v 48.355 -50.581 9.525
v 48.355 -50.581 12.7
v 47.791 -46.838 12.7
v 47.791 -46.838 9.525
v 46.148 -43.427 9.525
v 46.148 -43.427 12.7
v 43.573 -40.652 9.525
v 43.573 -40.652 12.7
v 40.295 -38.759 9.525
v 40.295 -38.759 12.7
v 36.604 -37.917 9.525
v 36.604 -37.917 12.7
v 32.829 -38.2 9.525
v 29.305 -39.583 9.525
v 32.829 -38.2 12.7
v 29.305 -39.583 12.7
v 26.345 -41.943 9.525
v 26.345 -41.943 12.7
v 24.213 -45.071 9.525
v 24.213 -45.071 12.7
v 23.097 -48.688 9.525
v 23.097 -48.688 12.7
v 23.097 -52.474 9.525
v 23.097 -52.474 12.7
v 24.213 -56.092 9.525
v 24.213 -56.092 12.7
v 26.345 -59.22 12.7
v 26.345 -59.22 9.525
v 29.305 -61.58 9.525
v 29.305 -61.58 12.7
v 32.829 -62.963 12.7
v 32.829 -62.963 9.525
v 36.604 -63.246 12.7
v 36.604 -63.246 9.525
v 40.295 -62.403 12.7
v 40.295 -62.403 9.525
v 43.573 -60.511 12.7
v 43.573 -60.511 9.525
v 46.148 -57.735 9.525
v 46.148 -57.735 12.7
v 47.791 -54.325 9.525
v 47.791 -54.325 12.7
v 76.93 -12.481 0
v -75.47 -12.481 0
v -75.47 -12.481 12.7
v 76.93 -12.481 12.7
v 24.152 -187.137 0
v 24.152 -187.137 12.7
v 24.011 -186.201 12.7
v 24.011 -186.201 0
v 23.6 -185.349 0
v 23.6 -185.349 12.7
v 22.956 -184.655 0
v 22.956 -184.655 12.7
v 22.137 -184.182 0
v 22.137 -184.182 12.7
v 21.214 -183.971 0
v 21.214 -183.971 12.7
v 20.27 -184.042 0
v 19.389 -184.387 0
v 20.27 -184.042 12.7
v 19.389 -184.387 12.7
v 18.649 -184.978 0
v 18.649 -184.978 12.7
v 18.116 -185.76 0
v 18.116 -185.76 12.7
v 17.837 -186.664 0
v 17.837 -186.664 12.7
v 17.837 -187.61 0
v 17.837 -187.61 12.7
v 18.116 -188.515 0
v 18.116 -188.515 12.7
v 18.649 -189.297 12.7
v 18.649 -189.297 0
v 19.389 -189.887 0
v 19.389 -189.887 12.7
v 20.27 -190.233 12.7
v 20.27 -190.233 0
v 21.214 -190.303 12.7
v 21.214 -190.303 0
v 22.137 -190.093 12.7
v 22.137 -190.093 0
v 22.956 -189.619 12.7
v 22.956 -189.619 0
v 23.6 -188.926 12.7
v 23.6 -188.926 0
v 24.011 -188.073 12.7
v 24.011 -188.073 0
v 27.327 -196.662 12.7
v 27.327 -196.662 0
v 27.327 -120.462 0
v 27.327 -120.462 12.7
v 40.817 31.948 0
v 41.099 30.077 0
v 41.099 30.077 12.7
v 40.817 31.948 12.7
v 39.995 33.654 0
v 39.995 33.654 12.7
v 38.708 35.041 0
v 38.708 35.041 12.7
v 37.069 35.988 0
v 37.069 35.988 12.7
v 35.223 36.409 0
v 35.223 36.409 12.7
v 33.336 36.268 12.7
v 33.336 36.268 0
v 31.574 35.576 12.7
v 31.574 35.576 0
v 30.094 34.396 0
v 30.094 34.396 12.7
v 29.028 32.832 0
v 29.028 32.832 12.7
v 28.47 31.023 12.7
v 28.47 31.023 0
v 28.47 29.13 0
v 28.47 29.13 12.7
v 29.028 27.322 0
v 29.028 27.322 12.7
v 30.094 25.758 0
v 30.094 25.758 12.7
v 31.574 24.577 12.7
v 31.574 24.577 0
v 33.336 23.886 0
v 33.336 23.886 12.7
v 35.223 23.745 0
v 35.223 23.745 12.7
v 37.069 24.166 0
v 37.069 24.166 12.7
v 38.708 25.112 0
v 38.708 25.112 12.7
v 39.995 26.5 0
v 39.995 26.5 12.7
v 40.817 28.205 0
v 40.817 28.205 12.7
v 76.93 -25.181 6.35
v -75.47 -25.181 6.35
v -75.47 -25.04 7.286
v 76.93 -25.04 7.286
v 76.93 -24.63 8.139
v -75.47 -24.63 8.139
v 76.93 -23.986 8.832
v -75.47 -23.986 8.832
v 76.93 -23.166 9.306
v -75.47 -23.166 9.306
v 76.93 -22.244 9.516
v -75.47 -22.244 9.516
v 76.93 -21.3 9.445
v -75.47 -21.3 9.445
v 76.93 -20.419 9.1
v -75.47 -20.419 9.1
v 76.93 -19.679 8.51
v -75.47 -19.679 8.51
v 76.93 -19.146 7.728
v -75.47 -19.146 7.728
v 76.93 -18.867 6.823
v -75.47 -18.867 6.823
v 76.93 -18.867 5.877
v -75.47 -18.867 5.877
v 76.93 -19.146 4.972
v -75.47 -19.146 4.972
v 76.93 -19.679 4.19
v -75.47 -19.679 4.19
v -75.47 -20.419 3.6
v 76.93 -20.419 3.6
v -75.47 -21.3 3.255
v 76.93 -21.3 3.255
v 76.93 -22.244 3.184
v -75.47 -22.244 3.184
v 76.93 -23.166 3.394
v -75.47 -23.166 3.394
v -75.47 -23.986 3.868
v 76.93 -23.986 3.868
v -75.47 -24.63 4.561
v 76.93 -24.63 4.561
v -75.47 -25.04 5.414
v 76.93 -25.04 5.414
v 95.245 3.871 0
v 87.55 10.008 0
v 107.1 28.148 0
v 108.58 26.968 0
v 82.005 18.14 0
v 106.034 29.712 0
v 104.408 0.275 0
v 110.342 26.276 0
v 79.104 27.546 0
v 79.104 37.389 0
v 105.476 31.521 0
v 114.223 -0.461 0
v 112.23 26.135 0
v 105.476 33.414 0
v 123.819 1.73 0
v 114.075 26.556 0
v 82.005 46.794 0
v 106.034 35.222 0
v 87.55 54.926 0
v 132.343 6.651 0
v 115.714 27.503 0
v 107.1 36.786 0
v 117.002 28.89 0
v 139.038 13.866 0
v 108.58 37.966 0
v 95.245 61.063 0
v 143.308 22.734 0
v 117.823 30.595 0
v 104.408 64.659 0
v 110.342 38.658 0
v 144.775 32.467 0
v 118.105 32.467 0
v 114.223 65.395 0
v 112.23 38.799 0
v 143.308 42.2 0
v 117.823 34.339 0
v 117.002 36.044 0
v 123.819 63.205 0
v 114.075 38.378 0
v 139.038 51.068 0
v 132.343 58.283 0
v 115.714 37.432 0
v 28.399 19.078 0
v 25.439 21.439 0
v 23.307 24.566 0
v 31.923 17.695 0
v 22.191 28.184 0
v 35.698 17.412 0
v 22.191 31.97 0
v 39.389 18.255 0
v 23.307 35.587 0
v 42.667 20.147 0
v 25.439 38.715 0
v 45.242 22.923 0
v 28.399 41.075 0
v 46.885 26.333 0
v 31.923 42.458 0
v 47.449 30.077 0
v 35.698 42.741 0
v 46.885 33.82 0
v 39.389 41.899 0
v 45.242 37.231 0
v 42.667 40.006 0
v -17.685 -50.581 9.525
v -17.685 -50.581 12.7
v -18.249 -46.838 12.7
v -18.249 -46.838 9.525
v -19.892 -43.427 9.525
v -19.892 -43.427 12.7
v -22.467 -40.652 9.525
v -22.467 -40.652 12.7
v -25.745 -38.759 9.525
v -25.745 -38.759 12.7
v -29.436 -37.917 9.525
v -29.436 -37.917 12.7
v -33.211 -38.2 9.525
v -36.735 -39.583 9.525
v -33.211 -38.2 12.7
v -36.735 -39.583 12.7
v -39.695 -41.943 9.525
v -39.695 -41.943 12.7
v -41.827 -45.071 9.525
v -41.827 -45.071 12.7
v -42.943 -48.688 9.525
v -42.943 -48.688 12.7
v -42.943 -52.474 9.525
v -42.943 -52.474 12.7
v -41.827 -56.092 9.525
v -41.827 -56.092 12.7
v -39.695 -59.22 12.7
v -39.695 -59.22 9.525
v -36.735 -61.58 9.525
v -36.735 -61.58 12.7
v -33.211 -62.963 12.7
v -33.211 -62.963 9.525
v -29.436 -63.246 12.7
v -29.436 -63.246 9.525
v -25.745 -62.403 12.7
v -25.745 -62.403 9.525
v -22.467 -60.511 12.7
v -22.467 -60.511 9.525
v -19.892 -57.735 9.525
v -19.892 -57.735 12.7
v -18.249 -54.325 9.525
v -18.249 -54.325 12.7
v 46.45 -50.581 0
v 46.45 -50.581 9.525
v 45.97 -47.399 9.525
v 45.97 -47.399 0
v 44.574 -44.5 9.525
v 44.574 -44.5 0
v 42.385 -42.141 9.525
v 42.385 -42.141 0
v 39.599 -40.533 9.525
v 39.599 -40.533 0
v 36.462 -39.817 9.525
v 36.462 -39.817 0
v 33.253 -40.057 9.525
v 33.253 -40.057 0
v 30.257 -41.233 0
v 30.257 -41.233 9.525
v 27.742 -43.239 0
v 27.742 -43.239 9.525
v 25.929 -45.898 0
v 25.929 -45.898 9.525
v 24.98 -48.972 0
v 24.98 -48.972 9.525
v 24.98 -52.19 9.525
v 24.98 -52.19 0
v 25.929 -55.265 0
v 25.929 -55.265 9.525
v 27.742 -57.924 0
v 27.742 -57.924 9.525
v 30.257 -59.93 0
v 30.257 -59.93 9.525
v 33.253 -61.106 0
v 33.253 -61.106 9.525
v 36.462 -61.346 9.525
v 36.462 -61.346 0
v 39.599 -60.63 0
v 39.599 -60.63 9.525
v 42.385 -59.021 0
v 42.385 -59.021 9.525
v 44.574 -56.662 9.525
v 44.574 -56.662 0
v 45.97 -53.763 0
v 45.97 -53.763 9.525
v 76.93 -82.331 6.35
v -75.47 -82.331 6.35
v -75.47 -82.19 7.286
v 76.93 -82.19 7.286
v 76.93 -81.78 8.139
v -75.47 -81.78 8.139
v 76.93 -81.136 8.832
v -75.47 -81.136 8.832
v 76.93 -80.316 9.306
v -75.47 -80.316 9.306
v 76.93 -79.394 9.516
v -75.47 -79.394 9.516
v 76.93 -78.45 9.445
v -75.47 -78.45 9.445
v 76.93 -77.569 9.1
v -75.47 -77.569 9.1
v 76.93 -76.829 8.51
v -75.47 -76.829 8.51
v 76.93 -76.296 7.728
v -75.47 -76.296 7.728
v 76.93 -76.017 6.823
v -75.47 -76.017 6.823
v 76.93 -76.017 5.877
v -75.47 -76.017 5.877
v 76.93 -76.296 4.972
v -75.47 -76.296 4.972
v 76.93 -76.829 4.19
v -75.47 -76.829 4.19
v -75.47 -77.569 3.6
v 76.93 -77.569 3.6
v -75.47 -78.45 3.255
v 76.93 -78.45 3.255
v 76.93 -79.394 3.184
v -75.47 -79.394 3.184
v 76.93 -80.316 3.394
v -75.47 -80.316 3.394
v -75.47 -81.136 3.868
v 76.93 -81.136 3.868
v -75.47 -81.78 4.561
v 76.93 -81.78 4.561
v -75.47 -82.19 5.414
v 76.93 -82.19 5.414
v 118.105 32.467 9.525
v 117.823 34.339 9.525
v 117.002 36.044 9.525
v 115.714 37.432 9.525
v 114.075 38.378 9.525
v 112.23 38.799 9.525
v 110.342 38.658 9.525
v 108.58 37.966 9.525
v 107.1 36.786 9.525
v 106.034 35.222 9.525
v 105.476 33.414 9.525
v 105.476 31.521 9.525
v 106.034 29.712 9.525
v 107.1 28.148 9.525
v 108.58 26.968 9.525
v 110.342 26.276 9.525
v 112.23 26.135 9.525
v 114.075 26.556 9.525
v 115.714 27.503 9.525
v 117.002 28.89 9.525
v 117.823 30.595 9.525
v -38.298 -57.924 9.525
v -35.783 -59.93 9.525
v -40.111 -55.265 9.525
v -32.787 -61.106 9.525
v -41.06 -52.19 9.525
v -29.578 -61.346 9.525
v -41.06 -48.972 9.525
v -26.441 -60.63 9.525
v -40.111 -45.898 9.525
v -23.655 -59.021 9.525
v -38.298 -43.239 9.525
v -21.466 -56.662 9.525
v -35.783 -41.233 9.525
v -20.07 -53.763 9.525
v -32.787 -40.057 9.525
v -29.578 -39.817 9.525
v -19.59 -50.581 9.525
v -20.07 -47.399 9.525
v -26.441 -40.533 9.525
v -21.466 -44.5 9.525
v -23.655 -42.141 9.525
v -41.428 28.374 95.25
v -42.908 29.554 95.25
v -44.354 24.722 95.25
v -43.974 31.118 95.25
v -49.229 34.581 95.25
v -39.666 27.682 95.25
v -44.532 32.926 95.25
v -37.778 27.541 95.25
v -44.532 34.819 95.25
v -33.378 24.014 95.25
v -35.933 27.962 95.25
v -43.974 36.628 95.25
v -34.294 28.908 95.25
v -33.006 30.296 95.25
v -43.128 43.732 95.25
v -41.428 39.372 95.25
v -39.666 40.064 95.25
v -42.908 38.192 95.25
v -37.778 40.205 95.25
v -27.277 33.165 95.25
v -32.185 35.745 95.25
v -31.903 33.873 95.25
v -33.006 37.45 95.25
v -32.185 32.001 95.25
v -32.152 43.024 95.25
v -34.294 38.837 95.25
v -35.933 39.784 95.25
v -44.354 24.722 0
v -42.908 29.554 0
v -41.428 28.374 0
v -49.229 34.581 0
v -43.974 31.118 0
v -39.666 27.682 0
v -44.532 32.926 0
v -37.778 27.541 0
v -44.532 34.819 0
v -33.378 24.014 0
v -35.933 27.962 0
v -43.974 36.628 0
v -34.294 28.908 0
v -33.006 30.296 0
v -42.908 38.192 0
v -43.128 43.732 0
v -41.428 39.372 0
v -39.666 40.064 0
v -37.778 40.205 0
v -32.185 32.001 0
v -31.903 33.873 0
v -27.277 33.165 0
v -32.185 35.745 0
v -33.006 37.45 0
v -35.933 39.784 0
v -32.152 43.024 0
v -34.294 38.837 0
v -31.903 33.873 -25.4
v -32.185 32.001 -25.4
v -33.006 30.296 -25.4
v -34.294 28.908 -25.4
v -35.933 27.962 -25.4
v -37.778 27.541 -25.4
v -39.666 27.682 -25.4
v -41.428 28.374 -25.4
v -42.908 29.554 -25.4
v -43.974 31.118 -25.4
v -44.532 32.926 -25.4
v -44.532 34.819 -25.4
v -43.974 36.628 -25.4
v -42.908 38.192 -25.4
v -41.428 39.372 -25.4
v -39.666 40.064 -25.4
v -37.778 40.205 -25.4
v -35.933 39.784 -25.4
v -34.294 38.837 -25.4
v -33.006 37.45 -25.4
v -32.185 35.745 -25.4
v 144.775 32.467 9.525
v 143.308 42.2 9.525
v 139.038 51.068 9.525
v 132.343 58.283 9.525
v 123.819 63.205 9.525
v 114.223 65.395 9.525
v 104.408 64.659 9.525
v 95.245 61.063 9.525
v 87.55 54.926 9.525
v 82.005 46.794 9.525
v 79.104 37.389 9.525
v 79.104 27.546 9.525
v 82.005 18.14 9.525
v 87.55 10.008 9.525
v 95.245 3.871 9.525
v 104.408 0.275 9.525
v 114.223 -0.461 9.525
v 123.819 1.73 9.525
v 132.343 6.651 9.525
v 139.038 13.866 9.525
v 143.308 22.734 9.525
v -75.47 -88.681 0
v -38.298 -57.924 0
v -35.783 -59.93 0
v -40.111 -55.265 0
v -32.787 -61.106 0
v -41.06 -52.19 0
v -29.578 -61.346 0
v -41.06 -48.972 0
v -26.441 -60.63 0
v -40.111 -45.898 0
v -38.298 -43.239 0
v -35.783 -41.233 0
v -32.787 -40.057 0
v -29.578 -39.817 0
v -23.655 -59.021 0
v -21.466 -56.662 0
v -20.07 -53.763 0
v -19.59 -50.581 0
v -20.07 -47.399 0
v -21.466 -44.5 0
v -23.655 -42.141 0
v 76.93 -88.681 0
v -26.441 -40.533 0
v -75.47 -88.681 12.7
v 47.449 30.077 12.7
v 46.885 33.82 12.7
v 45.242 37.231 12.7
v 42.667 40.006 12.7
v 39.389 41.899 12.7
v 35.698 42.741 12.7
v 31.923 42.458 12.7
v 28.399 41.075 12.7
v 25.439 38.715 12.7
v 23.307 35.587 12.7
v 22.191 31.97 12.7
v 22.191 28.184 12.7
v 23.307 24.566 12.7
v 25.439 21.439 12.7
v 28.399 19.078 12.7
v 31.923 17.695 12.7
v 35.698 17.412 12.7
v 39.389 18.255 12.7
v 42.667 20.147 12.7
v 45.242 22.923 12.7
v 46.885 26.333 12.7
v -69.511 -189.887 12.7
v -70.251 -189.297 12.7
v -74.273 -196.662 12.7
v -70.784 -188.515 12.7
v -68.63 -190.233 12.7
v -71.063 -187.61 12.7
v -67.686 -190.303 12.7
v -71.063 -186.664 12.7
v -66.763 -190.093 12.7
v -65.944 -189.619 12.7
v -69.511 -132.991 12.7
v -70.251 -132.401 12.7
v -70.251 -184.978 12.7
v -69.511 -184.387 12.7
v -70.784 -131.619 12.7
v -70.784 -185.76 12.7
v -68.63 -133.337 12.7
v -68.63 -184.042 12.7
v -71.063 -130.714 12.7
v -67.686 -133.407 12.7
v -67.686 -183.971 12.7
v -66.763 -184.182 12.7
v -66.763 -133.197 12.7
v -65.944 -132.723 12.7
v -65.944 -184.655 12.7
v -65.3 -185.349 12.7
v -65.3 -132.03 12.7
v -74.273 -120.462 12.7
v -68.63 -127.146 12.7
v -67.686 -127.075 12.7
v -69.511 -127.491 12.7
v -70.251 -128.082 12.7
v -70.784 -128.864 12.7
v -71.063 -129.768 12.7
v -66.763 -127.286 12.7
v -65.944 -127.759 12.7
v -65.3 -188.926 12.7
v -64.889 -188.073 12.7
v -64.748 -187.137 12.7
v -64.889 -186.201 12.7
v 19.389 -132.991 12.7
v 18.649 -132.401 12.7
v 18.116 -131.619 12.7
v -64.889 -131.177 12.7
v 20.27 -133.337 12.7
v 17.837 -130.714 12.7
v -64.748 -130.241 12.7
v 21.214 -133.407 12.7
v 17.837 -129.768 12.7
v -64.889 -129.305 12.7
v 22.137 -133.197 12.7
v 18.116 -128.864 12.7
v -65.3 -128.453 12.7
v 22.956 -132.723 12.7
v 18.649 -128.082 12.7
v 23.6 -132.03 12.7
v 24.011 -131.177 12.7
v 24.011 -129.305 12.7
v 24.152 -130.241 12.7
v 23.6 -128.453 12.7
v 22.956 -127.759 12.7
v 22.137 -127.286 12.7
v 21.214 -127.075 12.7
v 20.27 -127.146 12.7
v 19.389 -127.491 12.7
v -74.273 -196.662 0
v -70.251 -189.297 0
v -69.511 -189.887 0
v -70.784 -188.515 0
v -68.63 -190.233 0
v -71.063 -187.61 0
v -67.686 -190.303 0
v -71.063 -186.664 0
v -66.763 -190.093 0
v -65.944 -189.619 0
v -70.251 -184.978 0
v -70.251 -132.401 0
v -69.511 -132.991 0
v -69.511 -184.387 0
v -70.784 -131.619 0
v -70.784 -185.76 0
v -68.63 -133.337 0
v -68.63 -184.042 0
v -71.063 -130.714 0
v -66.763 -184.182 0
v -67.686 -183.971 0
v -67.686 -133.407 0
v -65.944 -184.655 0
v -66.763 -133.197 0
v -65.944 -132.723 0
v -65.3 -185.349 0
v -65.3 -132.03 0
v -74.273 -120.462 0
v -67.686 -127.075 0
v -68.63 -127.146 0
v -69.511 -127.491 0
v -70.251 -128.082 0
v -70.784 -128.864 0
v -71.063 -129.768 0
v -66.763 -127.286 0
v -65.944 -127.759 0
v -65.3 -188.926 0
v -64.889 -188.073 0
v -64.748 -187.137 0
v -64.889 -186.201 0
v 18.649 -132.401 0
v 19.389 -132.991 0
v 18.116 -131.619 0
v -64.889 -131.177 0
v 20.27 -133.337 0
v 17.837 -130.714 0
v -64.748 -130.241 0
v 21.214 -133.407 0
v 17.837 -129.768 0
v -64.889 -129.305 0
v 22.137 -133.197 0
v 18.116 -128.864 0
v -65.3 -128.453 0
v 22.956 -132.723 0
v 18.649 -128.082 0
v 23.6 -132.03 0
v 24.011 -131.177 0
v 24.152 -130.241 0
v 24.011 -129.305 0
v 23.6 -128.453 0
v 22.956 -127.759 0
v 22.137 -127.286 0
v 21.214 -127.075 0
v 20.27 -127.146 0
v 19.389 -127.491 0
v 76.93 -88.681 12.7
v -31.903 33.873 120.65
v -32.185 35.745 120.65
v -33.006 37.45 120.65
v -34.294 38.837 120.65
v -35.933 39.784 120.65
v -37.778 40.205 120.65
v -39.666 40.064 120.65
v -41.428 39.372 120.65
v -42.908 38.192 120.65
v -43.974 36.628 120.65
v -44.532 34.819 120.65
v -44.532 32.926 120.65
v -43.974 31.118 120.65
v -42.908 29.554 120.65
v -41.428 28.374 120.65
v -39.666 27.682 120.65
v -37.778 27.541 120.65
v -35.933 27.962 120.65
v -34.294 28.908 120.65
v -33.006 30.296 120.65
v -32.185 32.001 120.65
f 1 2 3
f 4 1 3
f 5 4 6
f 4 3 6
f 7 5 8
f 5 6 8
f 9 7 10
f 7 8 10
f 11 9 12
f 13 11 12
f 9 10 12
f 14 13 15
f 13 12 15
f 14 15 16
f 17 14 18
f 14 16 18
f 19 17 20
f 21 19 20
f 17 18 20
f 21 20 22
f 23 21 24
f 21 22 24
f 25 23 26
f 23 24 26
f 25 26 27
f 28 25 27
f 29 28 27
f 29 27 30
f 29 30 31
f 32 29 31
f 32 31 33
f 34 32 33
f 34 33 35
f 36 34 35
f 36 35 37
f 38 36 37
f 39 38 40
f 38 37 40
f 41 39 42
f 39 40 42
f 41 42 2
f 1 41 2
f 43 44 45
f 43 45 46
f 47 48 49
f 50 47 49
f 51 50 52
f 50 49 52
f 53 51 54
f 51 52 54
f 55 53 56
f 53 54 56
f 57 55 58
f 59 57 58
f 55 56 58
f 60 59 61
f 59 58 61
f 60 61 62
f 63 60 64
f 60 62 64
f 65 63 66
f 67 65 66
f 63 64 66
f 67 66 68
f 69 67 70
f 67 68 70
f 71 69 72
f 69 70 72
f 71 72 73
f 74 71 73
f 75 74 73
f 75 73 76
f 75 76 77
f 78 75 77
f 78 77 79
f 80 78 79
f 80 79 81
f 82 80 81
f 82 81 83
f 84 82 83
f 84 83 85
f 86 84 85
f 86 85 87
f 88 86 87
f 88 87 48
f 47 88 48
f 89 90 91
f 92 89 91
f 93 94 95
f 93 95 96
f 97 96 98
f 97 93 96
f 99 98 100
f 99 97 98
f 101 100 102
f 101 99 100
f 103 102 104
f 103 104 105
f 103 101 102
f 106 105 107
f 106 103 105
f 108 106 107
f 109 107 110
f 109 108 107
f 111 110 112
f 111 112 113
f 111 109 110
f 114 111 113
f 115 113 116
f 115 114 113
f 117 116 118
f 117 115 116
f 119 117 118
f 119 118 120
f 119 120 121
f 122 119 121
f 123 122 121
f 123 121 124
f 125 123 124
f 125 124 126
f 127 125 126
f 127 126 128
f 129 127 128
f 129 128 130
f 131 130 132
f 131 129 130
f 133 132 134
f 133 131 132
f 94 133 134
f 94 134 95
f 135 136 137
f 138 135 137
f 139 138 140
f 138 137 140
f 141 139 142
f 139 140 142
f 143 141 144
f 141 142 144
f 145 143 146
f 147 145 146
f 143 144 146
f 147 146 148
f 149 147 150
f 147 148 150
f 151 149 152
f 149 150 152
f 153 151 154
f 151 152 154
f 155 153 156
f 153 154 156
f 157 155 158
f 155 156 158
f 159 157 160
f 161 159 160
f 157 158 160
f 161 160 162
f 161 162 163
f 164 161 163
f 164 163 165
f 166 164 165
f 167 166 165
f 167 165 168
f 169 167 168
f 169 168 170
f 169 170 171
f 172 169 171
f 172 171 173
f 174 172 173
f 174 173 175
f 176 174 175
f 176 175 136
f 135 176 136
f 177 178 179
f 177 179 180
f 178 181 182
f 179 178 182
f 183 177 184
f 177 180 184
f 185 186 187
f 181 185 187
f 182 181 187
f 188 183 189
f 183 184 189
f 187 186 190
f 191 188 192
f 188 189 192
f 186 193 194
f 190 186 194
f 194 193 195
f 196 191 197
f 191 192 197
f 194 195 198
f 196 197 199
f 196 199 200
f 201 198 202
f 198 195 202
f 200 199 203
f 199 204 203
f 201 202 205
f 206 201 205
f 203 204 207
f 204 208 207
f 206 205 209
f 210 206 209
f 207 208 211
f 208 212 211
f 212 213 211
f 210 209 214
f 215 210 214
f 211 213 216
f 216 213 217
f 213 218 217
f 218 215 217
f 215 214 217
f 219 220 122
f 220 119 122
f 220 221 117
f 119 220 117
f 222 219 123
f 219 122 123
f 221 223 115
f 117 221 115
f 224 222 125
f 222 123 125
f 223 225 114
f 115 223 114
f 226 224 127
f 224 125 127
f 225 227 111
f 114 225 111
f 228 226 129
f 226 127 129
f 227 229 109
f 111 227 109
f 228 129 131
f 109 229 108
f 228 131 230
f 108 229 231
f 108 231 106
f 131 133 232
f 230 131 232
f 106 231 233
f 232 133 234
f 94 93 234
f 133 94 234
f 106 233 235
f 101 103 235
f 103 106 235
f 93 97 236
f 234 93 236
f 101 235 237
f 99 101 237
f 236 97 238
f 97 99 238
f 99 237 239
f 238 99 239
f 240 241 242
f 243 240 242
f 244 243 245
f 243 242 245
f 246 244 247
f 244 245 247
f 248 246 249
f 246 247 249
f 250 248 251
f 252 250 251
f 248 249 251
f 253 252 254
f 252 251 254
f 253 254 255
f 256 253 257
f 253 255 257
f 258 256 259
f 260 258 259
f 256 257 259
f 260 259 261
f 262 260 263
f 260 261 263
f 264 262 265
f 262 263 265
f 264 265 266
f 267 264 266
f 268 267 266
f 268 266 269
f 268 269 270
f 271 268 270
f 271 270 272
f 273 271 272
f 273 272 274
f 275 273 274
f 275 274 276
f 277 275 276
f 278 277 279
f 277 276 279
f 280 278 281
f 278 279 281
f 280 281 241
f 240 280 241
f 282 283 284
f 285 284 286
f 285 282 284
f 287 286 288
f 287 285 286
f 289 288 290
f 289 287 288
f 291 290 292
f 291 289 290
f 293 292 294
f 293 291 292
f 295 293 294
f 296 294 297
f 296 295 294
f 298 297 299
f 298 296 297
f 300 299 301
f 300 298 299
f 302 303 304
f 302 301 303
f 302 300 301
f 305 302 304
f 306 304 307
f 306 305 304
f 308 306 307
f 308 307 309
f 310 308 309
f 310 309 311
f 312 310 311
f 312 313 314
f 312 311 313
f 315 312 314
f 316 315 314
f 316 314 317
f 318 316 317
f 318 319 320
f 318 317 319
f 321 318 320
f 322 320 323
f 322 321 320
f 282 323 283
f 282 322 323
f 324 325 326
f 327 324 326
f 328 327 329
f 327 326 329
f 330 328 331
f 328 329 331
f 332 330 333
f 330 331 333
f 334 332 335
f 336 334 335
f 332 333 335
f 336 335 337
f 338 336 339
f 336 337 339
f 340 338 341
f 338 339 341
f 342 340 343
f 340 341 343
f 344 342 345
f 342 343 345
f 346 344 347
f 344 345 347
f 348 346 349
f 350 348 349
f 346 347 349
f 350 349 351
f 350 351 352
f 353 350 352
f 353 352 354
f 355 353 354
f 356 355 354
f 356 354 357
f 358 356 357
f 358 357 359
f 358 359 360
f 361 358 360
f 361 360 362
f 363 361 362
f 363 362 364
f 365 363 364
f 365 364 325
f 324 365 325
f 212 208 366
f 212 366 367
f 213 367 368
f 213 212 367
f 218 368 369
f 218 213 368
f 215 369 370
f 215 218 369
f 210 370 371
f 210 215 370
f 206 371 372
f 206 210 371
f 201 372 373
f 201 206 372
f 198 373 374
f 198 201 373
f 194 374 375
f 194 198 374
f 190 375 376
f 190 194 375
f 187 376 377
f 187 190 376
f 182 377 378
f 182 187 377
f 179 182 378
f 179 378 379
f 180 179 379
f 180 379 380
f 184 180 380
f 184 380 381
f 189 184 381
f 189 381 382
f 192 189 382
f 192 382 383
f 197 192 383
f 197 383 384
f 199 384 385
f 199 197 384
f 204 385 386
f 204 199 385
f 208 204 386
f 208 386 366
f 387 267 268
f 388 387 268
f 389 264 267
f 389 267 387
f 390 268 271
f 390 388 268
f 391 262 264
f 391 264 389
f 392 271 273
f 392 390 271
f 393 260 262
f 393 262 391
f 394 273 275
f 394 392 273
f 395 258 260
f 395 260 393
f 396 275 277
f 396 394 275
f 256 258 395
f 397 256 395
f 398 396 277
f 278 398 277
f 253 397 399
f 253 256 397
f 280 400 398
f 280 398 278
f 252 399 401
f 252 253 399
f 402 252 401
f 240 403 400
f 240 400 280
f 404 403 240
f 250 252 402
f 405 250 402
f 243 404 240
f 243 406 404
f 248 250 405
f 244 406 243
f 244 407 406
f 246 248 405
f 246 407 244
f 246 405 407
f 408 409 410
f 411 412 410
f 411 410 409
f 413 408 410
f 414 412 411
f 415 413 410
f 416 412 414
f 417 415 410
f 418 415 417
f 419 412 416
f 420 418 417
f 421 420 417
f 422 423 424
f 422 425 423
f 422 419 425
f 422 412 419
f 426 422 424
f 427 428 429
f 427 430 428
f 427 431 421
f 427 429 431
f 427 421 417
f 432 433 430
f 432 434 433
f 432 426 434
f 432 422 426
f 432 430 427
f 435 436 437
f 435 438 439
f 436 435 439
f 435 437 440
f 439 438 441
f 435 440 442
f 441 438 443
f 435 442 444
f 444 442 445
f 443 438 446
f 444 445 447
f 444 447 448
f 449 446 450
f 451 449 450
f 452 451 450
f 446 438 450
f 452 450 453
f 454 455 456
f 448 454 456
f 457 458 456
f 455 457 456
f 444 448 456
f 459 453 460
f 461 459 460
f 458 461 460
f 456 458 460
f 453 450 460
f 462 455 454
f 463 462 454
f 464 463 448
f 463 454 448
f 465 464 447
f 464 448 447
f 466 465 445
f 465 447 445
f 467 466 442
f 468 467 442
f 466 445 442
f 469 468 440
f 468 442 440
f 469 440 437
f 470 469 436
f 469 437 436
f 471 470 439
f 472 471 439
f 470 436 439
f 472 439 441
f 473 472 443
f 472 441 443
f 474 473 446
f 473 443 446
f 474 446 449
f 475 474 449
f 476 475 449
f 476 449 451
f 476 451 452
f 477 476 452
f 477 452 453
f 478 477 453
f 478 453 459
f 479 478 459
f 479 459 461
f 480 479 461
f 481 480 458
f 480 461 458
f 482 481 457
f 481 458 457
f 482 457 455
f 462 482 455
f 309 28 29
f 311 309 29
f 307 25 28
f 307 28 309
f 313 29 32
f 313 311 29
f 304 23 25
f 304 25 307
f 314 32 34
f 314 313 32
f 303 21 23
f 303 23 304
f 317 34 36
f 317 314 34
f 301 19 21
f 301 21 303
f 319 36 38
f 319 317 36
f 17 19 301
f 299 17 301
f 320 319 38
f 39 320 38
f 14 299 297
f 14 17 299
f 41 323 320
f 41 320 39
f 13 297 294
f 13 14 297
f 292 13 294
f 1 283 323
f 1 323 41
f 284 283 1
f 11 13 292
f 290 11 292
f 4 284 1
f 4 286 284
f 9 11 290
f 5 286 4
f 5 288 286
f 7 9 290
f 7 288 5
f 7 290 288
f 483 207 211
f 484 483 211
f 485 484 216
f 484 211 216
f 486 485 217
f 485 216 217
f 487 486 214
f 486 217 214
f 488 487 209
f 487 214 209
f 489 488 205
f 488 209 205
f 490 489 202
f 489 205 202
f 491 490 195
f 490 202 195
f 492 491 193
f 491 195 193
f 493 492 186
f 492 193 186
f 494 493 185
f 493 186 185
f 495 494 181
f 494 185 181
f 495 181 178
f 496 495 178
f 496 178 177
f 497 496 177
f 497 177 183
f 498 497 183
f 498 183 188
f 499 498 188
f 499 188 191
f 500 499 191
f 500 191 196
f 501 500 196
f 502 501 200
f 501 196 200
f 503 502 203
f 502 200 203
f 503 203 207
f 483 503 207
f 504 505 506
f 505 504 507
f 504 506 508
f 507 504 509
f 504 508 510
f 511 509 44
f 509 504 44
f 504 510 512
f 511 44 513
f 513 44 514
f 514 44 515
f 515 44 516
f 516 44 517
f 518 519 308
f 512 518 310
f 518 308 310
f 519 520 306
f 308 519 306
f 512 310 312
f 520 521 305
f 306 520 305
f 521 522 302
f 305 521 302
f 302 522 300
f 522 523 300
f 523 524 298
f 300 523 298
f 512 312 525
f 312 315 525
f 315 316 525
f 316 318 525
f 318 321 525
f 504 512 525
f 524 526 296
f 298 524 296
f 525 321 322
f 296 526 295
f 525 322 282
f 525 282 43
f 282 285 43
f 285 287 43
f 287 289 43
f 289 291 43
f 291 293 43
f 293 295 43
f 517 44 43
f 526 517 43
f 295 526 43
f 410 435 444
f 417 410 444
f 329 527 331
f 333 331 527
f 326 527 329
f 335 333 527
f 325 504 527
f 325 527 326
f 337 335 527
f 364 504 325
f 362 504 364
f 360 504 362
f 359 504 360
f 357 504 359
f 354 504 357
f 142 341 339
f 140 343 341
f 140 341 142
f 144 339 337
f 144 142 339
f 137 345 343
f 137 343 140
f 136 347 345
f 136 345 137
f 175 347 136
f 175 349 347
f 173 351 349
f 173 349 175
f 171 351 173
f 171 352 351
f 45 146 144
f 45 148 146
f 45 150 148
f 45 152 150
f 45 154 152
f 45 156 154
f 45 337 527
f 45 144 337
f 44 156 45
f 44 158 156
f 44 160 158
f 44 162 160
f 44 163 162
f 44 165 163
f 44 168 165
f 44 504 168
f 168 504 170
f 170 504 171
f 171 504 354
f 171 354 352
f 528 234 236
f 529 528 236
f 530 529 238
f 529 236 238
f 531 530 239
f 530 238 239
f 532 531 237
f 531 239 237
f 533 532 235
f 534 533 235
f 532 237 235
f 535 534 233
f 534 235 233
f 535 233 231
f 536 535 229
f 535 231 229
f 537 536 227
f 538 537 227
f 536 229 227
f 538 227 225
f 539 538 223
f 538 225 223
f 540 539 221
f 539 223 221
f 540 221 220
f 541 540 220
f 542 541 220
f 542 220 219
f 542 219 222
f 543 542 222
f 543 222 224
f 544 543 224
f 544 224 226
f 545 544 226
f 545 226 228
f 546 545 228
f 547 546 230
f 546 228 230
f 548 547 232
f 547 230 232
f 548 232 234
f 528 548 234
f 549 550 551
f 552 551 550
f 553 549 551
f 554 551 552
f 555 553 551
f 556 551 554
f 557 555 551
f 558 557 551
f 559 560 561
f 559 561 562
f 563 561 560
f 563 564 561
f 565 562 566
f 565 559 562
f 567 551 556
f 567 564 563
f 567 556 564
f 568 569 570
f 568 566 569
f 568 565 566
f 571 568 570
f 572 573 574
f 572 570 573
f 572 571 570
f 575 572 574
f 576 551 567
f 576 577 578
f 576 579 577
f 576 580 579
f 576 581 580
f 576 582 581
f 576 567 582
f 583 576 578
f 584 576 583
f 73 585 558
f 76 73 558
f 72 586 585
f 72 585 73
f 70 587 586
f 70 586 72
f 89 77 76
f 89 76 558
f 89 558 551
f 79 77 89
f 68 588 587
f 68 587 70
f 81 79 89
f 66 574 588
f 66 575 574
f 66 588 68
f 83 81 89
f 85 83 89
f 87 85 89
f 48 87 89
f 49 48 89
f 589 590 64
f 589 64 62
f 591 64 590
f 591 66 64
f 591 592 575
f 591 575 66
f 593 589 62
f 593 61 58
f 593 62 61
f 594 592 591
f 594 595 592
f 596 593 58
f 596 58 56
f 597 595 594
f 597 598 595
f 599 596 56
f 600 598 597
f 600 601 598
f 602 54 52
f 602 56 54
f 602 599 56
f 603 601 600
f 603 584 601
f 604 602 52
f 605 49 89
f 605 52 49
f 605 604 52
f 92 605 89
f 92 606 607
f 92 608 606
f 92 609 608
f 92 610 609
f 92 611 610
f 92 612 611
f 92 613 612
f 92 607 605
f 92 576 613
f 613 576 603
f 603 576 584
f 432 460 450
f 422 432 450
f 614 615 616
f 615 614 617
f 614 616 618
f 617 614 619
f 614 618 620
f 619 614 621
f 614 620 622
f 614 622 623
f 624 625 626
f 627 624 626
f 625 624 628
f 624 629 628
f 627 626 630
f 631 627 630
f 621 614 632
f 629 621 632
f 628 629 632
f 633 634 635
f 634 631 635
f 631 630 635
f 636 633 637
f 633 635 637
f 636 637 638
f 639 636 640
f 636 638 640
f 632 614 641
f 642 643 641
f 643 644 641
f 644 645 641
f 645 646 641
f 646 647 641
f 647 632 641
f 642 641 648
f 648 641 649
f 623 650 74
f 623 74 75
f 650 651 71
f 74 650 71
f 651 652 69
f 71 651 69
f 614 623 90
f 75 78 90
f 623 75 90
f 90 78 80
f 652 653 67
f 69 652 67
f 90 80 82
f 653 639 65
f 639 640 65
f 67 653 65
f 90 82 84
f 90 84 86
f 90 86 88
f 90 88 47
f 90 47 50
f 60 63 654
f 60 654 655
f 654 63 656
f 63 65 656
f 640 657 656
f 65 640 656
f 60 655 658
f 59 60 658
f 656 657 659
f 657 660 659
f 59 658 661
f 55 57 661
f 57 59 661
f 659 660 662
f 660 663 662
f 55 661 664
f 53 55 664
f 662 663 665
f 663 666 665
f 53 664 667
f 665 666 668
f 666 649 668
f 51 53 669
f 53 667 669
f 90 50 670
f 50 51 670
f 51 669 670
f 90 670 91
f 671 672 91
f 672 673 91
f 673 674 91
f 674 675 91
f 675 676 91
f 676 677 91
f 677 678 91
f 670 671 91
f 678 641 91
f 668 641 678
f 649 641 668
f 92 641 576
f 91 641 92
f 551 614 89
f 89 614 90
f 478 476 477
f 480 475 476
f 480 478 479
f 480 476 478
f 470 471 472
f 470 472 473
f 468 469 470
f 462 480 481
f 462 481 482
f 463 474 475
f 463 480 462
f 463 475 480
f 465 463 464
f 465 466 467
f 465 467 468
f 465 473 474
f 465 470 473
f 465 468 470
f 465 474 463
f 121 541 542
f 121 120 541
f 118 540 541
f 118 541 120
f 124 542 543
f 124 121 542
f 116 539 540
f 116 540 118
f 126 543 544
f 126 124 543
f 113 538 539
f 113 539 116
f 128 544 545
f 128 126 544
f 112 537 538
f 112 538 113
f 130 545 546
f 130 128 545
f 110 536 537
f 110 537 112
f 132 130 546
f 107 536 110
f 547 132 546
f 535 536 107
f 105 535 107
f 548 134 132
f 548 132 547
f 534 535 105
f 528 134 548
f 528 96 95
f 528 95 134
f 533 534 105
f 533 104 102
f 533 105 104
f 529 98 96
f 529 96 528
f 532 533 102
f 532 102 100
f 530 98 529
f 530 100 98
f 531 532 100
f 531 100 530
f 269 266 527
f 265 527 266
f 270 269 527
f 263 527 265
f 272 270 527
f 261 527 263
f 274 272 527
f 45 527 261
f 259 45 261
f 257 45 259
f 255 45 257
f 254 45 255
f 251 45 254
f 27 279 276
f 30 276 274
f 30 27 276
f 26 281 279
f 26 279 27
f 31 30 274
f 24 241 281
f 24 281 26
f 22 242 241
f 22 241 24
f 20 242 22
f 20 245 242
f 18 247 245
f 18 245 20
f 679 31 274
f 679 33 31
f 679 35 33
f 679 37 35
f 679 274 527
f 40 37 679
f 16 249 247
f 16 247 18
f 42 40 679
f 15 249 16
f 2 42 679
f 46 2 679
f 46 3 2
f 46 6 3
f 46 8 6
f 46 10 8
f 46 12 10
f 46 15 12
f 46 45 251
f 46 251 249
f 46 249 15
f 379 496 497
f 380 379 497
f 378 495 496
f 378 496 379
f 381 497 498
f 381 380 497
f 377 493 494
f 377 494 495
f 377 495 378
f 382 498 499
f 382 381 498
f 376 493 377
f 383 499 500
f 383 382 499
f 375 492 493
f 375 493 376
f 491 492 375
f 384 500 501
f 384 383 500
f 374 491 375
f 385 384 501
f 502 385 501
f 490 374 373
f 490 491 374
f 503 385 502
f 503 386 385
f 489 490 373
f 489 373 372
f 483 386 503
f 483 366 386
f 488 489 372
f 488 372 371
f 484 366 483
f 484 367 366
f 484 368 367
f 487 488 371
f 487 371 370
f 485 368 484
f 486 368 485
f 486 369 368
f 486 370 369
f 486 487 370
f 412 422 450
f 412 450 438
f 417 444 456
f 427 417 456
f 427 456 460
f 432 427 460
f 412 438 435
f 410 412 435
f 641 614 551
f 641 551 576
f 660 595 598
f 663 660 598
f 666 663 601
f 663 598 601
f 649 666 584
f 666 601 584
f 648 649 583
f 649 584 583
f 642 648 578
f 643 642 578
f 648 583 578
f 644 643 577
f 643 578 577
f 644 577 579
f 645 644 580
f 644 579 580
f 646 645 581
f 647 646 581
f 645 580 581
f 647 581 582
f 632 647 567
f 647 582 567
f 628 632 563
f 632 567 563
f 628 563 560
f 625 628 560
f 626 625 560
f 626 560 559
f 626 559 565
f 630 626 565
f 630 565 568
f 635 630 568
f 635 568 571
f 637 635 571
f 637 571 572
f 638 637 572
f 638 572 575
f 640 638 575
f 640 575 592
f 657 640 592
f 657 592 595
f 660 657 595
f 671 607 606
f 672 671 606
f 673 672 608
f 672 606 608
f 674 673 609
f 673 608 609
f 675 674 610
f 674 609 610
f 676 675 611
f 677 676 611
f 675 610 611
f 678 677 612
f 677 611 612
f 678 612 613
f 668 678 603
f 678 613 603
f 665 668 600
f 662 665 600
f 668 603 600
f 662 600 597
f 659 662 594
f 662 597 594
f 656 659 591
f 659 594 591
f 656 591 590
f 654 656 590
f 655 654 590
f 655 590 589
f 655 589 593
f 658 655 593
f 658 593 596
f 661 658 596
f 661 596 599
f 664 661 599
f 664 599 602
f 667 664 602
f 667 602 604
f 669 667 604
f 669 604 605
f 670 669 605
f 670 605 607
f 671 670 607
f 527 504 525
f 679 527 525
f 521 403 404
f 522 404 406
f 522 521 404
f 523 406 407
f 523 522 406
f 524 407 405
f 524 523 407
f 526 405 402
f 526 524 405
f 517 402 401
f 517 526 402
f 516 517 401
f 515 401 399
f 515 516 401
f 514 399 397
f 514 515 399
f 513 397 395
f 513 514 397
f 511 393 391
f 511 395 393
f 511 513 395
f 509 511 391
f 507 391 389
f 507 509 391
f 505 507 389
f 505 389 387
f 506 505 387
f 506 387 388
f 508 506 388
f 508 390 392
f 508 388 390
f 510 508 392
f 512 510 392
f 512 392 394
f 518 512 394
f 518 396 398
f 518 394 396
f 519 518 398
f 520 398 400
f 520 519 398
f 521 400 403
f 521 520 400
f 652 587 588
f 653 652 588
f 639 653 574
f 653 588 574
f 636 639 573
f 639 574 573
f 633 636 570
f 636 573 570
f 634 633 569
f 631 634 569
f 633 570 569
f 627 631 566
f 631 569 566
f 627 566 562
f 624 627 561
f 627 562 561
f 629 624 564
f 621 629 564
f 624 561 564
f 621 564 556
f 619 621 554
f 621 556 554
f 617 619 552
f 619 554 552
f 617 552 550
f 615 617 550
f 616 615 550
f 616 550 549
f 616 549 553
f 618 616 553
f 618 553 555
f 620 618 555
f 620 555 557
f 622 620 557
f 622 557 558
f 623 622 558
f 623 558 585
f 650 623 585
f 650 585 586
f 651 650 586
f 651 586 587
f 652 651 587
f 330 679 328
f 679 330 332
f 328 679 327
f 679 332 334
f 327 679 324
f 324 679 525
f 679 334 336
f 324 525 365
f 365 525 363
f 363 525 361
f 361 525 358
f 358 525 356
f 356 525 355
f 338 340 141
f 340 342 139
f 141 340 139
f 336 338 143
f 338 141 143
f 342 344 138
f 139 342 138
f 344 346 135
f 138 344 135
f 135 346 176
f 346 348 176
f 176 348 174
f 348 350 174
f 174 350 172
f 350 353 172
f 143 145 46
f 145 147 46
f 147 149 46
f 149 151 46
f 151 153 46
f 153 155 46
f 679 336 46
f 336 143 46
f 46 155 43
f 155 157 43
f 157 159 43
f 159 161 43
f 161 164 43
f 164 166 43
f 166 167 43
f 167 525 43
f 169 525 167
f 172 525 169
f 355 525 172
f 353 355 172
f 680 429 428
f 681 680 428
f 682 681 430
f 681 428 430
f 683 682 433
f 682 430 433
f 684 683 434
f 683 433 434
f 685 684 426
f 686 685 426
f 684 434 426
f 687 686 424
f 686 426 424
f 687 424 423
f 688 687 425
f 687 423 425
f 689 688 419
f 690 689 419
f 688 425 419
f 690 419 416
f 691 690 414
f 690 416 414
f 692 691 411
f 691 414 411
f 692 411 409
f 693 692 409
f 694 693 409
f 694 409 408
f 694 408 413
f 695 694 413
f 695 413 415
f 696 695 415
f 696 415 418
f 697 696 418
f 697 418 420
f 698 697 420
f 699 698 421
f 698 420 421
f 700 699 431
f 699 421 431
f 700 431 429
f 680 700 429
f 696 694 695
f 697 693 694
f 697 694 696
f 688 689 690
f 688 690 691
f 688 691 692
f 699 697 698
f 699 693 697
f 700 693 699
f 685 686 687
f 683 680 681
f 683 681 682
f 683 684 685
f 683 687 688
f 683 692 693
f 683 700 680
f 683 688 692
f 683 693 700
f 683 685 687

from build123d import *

# Parameters (mm, degrees)
F1_DEPTH  = 95.25
F2_R      = 6.35
F3_DEPTH  = 25.4
F4_R      = 6.35
F5_DEPTH  = 25.4
F6_R      = 12.7
F6_R_2    = 6.35
F7_DEPTH  = 12.7
F8_W      = 152.4
F8_H      = 76.2
F8_R      = 10.795
F9_DEPTH  = 12.7
F10_R     = 12.7
F11_DEPTH = 3.175
F12_W     = 101.6
F12_H     = 76.2
F13_DEPTH = 12.7
F14_R     = 3.175
F15_DEPTH = 152.401
F16_R     = 33.02
F16_R_2   = 6.35
F17_DEPTH = 9.525
F18_R     = 3.175
F19_DEPTH = 38.101


with BuildPart() as f1:
    # F0 (on Top) → F1 (new body)
    with BuildSketch(Plane.XY):
        Polygon((-33.378118, 24.013666), (-27.277237, 33.164991), (-32.152076, 43.024172), (-43.127797, 43.732027), (-49.228678, 34.580702), (-44.353838, 24.721522), align=None)
    extrude(amount=F1_DEPTH)

    # F2 (on face) → F3 (join)
    with BuildSketch(Plane.XY.offset(95.25)):
        with Locations((-38.252957, 33.872847)):
            Circle(F2_R)
    extrude(amount=F3_DEPTH)

    # F4 (on face) → F5 (join)
    with BuildSketch(Plane(origin=(0, 0, 0), x_dir=(1, 0, 0), z_dir=(0, 0, -1))):
        with Locations((-38.252957, -33.872847)):
            Circle(F4_R)
    extrude(amount=F5_DEPTH)


with BuildPart() as f7:
    # F6 (on Top) → F7 (new body)
    with BuildSketch(Plane.XY):
        with Locations((34.748867, 30.076751)):
            Circle(F6_R)
        with Locations((34.748867, 30.076751)):
            Circle(F6_R_2, mode=Mode.SUBTRACT)
    extrude(amount=F7_DEPTH)


with BuildPart() as f9:
    # F8 (on Top) → F9 (new body)
    with BuildSketch(Plane.XY):
        with Locations((0.729812, -50.581329)):
            Rectangle(F8_W, F8_H)
        with Locations((-30.385188, -50.581329)):
            Circle(F8_R, mode=Mode.SUBTRACT)
        with Locations((35.654812, -50.581329)):
            Circle(F8_R, mode=Mode.SUBTRACT)
    extrude(amount=F9_DEPTH)

    # F10 (on face) → F11 (cut)
    with BuildSketch(Plane.XY.offset(12.7)):
        with Locations((-30.385188, -50.581329)):
            Circle(F10_R)
        with Locations((35.654812, -50.581329)):
            Circle(F10_R)
    extrude(amount=-F11_DEPTH, mode=Mode.SUBTRACT)

    # F14 (on face) → F15 (cut, through all)
    with BuildSketch(Plane(origin=(-75.470188, 0, 0), x_dir=(0, -1, 0), z_dir=(-1, 0, 0))):
        with Locations((22.006329, 6.35)):
            Circle(F14_R)
        with Locations((79.156329, 6.35)):
            Circle(F14_R)
    extrude(amount=-F15_DEPTH, mode=Mode.SUBTRACT)


with BuildPart() as f13:
    # F12 (on Top) → F13 (new body)
    with BuildSketch(Plane.XY):
        with Locations((-23.473332, -158.562118)):
            Rectangle(F12_W, F12_H)
    extrude(amount=F13_DEPTH)

    # F18 (on face) → F19 (cut, through all)
    with BuildSketch(Plane.XY.offset(12.7)):
        with Locations((-67.923332, -130.241118)):
            Circle(F18_R)
        with Locations((-67.923332, -187.137118)):
            Circle(F18_R)
        with Locations((20.976668, -130.241118)):
            Circle(F18_R)
        with Locations((20.976668, -187.137118)):
            Circle(F18_R)
    extrude(amount=-F19_DEPTH, mode=Mode.SUBTRACT)


with BuildPart() as f17:
    # F16 (on Top) → F17 (new body)
    with BuildSketch(Plane.XY):
        with Locations((111.755282, 32.467157)):
            Circle(F16_R)
        with Locations((111.755282, 32.467157)):
            Circle(F16_R_2, mode=Mode.SUBTRACT)
    extrude(amount=F17_DEPTH)


solid = Compound([f1.part, f7.part, f9.part, f13.part, f17.part])
